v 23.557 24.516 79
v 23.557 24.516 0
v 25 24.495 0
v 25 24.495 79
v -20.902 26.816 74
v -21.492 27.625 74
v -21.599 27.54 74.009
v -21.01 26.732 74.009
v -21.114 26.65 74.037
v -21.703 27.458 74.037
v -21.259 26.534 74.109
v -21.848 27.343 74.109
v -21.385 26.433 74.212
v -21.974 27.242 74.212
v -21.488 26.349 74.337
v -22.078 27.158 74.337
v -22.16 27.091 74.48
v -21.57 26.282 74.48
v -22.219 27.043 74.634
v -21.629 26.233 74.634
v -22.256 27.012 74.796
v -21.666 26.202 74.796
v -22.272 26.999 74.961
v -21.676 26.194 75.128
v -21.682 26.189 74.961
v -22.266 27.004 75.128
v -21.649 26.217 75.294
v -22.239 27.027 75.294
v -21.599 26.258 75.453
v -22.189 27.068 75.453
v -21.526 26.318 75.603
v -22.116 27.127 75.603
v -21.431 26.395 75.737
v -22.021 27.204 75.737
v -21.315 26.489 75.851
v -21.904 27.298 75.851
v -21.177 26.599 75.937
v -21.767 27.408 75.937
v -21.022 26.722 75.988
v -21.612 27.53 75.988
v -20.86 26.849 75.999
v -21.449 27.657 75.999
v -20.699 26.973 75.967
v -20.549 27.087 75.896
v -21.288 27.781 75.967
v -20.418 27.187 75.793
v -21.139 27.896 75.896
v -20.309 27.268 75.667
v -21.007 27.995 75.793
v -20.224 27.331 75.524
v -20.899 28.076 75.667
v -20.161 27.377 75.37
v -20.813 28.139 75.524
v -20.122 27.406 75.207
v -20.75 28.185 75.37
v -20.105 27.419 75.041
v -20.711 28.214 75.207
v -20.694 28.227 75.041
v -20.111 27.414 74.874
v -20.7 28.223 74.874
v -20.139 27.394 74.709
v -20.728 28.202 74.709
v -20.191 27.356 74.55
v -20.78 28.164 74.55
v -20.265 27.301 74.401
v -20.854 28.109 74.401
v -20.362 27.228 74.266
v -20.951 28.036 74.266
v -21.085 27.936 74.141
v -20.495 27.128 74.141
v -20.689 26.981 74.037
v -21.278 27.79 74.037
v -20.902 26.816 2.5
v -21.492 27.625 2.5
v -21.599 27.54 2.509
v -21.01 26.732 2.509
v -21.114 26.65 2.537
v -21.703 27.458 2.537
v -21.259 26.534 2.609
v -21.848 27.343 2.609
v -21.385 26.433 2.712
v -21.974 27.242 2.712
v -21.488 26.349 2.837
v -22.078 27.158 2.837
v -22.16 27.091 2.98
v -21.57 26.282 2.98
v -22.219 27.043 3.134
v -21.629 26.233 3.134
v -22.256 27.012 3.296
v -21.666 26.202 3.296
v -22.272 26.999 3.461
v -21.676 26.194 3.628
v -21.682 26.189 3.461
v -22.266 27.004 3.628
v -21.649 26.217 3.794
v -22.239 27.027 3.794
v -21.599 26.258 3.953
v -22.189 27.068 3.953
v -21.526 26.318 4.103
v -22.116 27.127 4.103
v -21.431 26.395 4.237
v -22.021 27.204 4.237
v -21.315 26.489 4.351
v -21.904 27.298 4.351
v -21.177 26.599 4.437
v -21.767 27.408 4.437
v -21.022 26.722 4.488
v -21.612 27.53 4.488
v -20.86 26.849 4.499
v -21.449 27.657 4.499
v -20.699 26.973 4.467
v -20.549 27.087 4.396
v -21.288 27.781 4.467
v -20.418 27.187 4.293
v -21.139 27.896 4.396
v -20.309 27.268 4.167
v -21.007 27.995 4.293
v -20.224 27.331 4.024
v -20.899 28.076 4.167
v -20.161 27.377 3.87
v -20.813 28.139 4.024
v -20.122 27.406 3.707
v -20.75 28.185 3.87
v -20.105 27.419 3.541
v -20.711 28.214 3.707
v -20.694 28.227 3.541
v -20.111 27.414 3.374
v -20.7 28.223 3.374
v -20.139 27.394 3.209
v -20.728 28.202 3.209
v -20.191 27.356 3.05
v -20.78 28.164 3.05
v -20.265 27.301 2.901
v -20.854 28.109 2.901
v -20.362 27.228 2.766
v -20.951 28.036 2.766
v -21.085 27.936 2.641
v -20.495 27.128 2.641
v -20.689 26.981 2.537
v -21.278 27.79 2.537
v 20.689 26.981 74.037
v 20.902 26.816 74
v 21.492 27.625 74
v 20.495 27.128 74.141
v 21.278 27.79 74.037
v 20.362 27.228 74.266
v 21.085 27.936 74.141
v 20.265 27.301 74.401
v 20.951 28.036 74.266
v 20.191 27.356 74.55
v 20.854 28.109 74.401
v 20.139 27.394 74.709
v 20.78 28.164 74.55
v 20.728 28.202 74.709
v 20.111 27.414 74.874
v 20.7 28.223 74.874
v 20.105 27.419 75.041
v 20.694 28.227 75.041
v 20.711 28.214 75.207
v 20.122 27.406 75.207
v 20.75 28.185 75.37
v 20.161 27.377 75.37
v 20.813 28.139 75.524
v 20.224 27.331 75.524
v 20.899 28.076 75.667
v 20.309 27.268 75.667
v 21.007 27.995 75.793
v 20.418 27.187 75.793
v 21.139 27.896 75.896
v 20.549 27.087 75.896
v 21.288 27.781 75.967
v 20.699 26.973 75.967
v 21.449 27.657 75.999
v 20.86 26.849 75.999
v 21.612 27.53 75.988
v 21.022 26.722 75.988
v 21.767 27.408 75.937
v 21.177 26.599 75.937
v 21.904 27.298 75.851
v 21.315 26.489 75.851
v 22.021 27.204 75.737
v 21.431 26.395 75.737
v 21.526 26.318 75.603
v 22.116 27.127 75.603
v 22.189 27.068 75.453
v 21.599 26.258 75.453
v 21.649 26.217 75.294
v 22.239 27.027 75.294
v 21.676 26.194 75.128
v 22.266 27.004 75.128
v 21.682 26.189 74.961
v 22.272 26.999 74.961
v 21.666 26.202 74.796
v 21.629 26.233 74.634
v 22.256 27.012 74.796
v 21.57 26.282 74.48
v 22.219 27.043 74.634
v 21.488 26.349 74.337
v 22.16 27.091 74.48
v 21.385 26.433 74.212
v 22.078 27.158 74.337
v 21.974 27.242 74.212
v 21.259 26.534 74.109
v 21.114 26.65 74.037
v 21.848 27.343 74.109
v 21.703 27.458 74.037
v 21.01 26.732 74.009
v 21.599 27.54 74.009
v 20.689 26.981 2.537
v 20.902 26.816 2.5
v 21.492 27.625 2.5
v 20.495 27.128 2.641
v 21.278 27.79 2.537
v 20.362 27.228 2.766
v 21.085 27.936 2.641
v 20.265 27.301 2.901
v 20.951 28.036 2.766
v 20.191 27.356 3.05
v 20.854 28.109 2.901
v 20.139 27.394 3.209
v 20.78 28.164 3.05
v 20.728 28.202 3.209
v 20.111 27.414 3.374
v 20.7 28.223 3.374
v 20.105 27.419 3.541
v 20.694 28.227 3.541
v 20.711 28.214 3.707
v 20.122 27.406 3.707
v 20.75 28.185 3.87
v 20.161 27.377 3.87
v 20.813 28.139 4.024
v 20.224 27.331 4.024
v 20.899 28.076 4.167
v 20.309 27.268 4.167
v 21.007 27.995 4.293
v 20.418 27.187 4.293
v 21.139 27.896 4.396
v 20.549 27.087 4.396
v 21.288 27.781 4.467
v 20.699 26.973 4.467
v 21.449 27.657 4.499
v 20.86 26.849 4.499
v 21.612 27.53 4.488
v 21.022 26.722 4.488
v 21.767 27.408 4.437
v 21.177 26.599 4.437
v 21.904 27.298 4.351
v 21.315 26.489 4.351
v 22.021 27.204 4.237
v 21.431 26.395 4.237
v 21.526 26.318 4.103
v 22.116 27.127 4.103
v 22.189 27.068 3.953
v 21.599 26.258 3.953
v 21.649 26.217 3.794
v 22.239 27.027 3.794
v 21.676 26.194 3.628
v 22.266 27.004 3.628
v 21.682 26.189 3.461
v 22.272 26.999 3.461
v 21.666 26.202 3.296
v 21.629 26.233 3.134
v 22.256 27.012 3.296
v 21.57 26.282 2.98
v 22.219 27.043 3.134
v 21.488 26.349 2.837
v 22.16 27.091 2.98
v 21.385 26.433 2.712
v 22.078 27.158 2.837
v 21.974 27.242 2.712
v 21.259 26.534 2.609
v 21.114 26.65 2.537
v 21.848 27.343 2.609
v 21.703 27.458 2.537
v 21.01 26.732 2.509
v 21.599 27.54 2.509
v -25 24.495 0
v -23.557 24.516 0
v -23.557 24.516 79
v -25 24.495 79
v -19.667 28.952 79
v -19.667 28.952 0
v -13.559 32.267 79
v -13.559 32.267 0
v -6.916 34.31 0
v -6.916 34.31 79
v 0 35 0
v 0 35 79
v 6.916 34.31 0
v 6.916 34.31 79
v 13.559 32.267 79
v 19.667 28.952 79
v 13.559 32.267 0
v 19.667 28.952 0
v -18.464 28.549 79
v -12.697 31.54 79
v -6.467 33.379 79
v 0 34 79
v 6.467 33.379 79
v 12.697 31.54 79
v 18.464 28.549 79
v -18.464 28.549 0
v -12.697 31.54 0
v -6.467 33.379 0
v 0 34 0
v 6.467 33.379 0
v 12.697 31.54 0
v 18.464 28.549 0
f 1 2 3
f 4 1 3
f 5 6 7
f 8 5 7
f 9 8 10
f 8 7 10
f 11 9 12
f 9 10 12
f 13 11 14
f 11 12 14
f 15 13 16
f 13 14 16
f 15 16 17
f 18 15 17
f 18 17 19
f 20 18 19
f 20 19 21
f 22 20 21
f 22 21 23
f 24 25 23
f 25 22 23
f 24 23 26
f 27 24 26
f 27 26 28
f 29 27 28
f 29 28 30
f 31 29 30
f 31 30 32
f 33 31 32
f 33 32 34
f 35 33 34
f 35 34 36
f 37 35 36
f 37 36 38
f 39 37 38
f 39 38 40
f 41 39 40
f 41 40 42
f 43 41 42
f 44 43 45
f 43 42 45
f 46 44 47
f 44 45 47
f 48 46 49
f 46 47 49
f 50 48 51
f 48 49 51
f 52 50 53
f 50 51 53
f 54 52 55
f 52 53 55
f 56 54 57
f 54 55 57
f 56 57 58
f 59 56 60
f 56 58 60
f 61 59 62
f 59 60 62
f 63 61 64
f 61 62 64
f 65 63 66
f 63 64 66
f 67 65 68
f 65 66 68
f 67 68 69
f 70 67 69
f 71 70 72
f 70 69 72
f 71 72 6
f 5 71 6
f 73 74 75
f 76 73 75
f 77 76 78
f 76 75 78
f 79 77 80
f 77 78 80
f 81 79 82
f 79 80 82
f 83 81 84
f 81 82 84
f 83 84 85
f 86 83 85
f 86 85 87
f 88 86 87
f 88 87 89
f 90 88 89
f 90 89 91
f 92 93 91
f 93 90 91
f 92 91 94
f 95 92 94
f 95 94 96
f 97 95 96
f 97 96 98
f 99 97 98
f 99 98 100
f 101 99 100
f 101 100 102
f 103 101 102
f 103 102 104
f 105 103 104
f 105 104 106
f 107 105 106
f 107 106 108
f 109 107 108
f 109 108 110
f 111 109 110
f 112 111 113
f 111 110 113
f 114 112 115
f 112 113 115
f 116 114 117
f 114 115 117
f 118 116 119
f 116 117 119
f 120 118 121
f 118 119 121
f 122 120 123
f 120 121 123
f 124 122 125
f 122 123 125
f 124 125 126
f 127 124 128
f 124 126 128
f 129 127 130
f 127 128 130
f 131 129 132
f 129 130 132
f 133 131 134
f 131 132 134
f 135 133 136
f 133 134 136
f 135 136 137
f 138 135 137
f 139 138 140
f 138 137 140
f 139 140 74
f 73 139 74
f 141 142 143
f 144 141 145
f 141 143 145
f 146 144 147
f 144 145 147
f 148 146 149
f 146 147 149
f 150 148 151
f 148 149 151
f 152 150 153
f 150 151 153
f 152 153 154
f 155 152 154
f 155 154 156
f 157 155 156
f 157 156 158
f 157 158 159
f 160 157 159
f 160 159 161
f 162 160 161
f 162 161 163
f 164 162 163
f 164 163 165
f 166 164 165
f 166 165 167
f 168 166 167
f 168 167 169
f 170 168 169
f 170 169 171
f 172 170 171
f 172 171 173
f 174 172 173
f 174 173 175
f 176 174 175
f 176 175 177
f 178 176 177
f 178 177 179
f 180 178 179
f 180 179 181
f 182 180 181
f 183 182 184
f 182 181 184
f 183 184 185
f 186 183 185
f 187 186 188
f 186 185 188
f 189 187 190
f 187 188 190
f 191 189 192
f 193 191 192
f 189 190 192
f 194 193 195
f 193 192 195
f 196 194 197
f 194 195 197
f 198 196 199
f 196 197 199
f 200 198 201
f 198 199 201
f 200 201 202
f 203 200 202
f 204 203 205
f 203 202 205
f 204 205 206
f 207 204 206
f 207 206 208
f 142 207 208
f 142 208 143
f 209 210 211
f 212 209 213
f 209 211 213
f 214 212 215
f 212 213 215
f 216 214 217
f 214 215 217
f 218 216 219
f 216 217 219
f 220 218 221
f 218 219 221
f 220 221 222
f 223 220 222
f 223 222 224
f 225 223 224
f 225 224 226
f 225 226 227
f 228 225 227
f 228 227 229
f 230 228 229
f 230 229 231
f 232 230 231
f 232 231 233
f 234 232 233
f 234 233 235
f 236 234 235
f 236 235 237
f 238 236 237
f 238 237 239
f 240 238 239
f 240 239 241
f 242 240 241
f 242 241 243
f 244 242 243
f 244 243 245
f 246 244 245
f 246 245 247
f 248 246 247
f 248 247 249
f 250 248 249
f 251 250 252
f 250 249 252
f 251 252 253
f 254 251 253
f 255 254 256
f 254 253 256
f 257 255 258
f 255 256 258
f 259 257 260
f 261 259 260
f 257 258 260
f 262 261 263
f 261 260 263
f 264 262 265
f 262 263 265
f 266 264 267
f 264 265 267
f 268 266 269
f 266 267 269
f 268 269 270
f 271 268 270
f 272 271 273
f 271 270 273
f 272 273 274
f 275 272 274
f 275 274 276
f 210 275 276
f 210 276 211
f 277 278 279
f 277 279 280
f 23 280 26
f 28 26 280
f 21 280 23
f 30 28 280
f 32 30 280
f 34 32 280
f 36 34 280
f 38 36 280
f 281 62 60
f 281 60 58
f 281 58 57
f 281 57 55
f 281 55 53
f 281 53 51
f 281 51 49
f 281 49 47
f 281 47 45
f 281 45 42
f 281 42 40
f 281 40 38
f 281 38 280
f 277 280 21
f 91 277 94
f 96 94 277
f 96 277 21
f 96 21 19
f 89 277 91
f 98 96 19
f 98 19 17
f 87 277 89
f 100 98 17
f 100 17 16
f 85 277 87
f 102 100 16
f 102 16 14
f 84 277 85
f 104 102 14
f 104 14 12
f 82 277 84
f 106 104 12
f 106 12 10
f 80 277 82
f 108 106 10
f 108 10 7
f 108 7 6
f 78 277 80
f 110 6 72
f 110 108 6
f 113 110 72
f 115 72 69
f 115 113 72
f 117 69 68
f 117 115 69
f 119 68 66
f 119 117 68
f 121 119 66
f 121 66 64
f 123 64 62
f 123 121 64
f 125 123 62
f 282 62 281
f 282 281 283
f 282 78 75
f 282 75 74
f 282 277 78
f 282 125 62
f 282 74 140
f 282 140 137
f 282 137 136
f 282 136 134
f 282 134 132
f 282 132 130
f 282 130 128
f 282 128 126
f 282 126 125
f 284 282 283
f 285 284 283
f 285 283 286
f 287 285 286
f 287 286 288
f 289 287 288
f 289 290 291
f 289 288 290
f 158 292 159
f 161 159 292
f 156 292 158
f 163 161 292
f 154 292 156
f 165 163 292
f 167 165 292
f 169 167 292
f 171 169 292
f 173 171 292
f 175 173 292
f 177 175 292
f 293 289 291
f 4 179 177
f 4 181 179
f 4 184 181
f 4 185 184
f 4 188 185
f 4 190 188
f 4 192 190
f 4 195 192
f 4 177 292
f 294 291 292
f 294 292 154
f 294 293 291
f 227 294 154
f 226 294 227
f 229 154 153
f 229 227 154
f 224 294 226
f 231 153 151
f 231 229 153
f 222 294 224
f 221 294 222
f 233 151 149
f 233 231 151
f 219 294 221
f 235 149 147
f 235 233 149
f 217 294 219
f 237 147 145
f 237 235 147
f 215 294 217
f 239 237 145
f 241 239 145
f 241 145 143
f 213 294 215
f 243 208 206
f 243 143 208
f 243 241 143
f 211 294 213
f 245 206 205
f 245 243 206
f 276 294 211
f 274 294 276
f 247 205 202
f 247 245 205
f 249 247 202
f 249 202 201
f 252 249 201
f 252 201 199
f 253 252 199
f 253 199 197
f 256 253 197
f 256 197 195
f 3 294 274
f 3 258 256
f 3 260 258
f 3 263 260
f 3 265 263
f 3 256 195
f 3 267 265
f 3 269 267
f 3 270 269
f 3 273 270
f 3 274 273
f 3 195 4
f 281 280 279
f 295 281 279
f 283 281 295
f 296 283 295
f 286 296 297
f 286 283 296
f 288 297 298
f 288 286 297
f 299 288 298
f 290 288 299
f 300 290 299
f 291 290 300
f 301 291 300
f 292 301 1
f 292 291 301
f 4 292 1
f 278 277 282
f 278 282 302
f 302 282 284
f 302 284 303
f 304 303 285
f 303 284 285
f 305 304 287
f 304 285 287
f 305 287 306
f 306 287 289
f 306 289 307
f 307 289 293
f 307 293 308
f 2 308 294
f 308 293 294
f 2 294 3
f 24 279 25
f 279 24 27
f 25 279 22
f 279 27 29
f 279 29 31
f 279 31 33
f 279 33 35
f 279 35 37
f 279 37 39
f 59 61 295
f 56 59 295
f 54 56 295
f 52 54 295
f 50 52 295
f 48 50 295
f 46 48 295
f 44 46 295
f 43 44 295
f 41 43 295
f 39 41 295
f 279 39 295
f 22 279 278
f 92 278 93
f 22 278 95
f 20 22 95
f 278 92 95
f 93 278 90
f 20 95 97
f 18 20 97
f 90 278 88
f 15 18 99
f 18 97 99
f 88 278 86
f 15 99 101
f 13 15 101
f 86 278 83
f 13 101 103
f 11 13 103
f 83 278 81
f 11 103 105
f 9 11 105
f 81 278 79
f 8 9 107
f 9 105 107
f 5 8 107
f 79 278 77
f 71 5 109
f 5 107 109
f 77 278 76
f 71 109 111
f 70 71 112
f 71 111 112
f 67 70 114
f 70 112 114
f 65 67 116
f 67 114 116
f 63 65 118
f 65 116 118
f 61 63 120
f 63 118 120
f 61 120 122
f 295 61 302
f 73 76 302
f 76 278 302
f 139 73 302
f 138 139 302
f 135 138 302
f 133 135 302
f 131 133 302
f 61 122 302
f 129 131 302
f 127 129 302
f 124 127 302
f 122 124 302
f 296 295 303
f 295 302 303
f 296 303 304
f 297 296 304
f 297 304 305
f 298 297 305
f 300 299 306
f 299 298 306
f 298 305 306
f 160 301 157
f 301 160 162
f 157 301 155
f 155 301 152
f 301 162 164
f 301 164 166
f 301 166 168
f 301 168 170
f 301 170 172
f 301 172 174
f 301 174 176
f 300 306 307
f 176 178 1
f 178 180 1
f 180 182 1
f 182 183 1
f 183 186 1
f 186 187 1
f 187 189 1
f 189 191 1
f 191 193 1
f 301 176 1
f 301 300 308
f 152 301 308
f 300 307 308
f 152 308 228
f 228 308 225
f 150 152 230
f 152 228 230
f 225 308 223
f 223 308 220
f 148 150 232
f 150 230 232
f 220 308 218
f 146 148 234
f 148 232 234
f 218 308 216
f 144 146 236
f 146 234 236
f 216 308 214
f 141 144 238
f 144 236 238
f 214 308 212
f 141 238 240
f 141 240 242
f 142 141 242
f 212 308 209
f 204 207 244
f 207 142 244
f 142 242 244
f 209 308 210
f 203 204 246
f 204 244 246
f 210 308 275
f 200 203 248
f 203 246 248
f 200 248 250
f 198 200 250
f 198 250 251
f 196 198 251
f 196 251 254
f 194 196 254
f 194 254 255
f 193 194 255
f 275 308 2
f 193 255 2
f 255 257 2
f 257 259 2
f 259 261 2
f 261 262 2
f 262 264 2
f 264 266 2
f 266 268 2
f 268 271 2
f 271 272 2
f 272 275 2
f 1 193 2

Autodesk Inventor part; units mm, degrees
ref_plane "YZ Plane" through (0, 0, 0) normal (1, 0, 0) x (0, 1, 0)
sketch "Sketch8" plane through (0, 0, 0) normal (0, 0, 1) x (1, 0, 0)
  arc A0 (23.5572, 24.5165) -> (-23.5572, 24.5165) centre (0, 0) ccw
  arc A1 (25, 24.4949) -> (-25, 24.4949) centre (0, 0) ccw
  line L0 (-23.5572, 24.5165) -> (-25, 24.4949)
  line L1 (-24.431, 23.6769) -> (-22.7081, 25.3323) construction
  line L2 (22.7844, 25.2591) -> (24.3419, 23.7625) construction
  line L3 (23.5572, 24.5165) -> (25, 24.4949)
  line L4 (-25, 24.4949) -> (25, 24.4949) construction
  dimension "d88" = 34
  dimension "d89" = 35
  dimension "d90" = 0
  dimension "d91" = 137
  dimension "d92" = 0
  dimension "d93" = 137
  dimension "d98" = 50
extrude "Extrusion5" add sketch "Sketch8" along normal blind 79
sketch "Sketch19" plane through (0, 0, 79) normal (0, 0, 1) x (1, 0, 0)
  line L0 (-25, 24.4949) -> (-23.5572, 24.5165) construction
  line L1 (-22.2755, 25.021) -> (-7.4699, 32.6566) construction
  arc A0 (22.2755, 25.021) -> (-22.2755, 25.021) centre (0, 0) ccw construction
  dimension "d162" = 32.448
sketch "Sketch22" plane through (0, 0, 79) normal (0, 0, 1) x (1, 0, 0)
  line L0 (0, 0) -> (23.9071, 24.8806) construction
  line L1 (0, 0) -> (31.302, 21.2274) construction
  arc A0 (23.5572, 24.5165) -> (-23.5572, 24.5165) centre (0, 0) ccw construction
  arc A1 (29.7973, 16.3744) -> (23.5572, 24.5165) centre (0, 0) ccw construction
  line L2 (28.1397, 19.0829) -> (9.553, 32.6304) construction
  point P0 (19.5664, 25.3318)
  dimension "d175" = 12
  dimension "d176" = 23
  dimension "d177" = 0
  dimension "d178" = 10.609
sketch "Sketch23" plane through (0, 0, 0) normal (0, 0, -1) x (-1, 0, 0)
  arc A0 (23.5572, 24.5165) -> (-23.5572, 24.5165) centre (0, 0) ccw projected
  line L0 (0, 0) -> (-23.5572, 24.5165) construction
  line L1 (0, 0) -> (-31.0154, 21.0331) construction
  arc A1 (-23.5572, 24.5165) -> (-29.6271, 16.6805) centre (0, 0) ccw construction
  line L2 (-28.1397, 19.0829) -> (-9.553, 32.6304) construction
  dimension "d179" = 12
  dimension "d180" = 23
ref_plane "Work Plane12" through (28.1397, 19.0829, 79) normal (-0.589, -0.8081, 0) x (-0.8081, 0.589, 0)
sketch "Sketch24" plane through (28.1397, 19.0829, 79) normal (-0.589, -0.8081, 0) x (-0.8081, 0.589, 0)
  line L0 (6.9037, 79) -> (6.9037, 0) projected
  line L1 (44.9777, 0) -> (6.9037, 0) projected
  line L2 (44.9777, 79) -> (6.9037, 79) projected
  point P0 (11.5, 79)
  point P1 (10.4037, 75.5)
  point P2 (10.4037, 4)
  dimension "d181" = 3.5
  dimension "d182" = 4
  dimension "d183" = 3.5
  dimension "d184" = 3.5
hole "Hole11" at (19.7323, 25.2109, 3.5) at (19.7323, 25.2109, 75) direction (0.589, 0.8081, 0) diameter 2 end through all
ref_plane "Work Plane13" through (0, 24.8688, 0) normal (1, 0, 0) x (0, 0, 1)
mirror "Mirror2" about plane through (0, 24.8688, 0) normal (1, 0, 0) of "Hole11"
properties part number "Electronics Door"
